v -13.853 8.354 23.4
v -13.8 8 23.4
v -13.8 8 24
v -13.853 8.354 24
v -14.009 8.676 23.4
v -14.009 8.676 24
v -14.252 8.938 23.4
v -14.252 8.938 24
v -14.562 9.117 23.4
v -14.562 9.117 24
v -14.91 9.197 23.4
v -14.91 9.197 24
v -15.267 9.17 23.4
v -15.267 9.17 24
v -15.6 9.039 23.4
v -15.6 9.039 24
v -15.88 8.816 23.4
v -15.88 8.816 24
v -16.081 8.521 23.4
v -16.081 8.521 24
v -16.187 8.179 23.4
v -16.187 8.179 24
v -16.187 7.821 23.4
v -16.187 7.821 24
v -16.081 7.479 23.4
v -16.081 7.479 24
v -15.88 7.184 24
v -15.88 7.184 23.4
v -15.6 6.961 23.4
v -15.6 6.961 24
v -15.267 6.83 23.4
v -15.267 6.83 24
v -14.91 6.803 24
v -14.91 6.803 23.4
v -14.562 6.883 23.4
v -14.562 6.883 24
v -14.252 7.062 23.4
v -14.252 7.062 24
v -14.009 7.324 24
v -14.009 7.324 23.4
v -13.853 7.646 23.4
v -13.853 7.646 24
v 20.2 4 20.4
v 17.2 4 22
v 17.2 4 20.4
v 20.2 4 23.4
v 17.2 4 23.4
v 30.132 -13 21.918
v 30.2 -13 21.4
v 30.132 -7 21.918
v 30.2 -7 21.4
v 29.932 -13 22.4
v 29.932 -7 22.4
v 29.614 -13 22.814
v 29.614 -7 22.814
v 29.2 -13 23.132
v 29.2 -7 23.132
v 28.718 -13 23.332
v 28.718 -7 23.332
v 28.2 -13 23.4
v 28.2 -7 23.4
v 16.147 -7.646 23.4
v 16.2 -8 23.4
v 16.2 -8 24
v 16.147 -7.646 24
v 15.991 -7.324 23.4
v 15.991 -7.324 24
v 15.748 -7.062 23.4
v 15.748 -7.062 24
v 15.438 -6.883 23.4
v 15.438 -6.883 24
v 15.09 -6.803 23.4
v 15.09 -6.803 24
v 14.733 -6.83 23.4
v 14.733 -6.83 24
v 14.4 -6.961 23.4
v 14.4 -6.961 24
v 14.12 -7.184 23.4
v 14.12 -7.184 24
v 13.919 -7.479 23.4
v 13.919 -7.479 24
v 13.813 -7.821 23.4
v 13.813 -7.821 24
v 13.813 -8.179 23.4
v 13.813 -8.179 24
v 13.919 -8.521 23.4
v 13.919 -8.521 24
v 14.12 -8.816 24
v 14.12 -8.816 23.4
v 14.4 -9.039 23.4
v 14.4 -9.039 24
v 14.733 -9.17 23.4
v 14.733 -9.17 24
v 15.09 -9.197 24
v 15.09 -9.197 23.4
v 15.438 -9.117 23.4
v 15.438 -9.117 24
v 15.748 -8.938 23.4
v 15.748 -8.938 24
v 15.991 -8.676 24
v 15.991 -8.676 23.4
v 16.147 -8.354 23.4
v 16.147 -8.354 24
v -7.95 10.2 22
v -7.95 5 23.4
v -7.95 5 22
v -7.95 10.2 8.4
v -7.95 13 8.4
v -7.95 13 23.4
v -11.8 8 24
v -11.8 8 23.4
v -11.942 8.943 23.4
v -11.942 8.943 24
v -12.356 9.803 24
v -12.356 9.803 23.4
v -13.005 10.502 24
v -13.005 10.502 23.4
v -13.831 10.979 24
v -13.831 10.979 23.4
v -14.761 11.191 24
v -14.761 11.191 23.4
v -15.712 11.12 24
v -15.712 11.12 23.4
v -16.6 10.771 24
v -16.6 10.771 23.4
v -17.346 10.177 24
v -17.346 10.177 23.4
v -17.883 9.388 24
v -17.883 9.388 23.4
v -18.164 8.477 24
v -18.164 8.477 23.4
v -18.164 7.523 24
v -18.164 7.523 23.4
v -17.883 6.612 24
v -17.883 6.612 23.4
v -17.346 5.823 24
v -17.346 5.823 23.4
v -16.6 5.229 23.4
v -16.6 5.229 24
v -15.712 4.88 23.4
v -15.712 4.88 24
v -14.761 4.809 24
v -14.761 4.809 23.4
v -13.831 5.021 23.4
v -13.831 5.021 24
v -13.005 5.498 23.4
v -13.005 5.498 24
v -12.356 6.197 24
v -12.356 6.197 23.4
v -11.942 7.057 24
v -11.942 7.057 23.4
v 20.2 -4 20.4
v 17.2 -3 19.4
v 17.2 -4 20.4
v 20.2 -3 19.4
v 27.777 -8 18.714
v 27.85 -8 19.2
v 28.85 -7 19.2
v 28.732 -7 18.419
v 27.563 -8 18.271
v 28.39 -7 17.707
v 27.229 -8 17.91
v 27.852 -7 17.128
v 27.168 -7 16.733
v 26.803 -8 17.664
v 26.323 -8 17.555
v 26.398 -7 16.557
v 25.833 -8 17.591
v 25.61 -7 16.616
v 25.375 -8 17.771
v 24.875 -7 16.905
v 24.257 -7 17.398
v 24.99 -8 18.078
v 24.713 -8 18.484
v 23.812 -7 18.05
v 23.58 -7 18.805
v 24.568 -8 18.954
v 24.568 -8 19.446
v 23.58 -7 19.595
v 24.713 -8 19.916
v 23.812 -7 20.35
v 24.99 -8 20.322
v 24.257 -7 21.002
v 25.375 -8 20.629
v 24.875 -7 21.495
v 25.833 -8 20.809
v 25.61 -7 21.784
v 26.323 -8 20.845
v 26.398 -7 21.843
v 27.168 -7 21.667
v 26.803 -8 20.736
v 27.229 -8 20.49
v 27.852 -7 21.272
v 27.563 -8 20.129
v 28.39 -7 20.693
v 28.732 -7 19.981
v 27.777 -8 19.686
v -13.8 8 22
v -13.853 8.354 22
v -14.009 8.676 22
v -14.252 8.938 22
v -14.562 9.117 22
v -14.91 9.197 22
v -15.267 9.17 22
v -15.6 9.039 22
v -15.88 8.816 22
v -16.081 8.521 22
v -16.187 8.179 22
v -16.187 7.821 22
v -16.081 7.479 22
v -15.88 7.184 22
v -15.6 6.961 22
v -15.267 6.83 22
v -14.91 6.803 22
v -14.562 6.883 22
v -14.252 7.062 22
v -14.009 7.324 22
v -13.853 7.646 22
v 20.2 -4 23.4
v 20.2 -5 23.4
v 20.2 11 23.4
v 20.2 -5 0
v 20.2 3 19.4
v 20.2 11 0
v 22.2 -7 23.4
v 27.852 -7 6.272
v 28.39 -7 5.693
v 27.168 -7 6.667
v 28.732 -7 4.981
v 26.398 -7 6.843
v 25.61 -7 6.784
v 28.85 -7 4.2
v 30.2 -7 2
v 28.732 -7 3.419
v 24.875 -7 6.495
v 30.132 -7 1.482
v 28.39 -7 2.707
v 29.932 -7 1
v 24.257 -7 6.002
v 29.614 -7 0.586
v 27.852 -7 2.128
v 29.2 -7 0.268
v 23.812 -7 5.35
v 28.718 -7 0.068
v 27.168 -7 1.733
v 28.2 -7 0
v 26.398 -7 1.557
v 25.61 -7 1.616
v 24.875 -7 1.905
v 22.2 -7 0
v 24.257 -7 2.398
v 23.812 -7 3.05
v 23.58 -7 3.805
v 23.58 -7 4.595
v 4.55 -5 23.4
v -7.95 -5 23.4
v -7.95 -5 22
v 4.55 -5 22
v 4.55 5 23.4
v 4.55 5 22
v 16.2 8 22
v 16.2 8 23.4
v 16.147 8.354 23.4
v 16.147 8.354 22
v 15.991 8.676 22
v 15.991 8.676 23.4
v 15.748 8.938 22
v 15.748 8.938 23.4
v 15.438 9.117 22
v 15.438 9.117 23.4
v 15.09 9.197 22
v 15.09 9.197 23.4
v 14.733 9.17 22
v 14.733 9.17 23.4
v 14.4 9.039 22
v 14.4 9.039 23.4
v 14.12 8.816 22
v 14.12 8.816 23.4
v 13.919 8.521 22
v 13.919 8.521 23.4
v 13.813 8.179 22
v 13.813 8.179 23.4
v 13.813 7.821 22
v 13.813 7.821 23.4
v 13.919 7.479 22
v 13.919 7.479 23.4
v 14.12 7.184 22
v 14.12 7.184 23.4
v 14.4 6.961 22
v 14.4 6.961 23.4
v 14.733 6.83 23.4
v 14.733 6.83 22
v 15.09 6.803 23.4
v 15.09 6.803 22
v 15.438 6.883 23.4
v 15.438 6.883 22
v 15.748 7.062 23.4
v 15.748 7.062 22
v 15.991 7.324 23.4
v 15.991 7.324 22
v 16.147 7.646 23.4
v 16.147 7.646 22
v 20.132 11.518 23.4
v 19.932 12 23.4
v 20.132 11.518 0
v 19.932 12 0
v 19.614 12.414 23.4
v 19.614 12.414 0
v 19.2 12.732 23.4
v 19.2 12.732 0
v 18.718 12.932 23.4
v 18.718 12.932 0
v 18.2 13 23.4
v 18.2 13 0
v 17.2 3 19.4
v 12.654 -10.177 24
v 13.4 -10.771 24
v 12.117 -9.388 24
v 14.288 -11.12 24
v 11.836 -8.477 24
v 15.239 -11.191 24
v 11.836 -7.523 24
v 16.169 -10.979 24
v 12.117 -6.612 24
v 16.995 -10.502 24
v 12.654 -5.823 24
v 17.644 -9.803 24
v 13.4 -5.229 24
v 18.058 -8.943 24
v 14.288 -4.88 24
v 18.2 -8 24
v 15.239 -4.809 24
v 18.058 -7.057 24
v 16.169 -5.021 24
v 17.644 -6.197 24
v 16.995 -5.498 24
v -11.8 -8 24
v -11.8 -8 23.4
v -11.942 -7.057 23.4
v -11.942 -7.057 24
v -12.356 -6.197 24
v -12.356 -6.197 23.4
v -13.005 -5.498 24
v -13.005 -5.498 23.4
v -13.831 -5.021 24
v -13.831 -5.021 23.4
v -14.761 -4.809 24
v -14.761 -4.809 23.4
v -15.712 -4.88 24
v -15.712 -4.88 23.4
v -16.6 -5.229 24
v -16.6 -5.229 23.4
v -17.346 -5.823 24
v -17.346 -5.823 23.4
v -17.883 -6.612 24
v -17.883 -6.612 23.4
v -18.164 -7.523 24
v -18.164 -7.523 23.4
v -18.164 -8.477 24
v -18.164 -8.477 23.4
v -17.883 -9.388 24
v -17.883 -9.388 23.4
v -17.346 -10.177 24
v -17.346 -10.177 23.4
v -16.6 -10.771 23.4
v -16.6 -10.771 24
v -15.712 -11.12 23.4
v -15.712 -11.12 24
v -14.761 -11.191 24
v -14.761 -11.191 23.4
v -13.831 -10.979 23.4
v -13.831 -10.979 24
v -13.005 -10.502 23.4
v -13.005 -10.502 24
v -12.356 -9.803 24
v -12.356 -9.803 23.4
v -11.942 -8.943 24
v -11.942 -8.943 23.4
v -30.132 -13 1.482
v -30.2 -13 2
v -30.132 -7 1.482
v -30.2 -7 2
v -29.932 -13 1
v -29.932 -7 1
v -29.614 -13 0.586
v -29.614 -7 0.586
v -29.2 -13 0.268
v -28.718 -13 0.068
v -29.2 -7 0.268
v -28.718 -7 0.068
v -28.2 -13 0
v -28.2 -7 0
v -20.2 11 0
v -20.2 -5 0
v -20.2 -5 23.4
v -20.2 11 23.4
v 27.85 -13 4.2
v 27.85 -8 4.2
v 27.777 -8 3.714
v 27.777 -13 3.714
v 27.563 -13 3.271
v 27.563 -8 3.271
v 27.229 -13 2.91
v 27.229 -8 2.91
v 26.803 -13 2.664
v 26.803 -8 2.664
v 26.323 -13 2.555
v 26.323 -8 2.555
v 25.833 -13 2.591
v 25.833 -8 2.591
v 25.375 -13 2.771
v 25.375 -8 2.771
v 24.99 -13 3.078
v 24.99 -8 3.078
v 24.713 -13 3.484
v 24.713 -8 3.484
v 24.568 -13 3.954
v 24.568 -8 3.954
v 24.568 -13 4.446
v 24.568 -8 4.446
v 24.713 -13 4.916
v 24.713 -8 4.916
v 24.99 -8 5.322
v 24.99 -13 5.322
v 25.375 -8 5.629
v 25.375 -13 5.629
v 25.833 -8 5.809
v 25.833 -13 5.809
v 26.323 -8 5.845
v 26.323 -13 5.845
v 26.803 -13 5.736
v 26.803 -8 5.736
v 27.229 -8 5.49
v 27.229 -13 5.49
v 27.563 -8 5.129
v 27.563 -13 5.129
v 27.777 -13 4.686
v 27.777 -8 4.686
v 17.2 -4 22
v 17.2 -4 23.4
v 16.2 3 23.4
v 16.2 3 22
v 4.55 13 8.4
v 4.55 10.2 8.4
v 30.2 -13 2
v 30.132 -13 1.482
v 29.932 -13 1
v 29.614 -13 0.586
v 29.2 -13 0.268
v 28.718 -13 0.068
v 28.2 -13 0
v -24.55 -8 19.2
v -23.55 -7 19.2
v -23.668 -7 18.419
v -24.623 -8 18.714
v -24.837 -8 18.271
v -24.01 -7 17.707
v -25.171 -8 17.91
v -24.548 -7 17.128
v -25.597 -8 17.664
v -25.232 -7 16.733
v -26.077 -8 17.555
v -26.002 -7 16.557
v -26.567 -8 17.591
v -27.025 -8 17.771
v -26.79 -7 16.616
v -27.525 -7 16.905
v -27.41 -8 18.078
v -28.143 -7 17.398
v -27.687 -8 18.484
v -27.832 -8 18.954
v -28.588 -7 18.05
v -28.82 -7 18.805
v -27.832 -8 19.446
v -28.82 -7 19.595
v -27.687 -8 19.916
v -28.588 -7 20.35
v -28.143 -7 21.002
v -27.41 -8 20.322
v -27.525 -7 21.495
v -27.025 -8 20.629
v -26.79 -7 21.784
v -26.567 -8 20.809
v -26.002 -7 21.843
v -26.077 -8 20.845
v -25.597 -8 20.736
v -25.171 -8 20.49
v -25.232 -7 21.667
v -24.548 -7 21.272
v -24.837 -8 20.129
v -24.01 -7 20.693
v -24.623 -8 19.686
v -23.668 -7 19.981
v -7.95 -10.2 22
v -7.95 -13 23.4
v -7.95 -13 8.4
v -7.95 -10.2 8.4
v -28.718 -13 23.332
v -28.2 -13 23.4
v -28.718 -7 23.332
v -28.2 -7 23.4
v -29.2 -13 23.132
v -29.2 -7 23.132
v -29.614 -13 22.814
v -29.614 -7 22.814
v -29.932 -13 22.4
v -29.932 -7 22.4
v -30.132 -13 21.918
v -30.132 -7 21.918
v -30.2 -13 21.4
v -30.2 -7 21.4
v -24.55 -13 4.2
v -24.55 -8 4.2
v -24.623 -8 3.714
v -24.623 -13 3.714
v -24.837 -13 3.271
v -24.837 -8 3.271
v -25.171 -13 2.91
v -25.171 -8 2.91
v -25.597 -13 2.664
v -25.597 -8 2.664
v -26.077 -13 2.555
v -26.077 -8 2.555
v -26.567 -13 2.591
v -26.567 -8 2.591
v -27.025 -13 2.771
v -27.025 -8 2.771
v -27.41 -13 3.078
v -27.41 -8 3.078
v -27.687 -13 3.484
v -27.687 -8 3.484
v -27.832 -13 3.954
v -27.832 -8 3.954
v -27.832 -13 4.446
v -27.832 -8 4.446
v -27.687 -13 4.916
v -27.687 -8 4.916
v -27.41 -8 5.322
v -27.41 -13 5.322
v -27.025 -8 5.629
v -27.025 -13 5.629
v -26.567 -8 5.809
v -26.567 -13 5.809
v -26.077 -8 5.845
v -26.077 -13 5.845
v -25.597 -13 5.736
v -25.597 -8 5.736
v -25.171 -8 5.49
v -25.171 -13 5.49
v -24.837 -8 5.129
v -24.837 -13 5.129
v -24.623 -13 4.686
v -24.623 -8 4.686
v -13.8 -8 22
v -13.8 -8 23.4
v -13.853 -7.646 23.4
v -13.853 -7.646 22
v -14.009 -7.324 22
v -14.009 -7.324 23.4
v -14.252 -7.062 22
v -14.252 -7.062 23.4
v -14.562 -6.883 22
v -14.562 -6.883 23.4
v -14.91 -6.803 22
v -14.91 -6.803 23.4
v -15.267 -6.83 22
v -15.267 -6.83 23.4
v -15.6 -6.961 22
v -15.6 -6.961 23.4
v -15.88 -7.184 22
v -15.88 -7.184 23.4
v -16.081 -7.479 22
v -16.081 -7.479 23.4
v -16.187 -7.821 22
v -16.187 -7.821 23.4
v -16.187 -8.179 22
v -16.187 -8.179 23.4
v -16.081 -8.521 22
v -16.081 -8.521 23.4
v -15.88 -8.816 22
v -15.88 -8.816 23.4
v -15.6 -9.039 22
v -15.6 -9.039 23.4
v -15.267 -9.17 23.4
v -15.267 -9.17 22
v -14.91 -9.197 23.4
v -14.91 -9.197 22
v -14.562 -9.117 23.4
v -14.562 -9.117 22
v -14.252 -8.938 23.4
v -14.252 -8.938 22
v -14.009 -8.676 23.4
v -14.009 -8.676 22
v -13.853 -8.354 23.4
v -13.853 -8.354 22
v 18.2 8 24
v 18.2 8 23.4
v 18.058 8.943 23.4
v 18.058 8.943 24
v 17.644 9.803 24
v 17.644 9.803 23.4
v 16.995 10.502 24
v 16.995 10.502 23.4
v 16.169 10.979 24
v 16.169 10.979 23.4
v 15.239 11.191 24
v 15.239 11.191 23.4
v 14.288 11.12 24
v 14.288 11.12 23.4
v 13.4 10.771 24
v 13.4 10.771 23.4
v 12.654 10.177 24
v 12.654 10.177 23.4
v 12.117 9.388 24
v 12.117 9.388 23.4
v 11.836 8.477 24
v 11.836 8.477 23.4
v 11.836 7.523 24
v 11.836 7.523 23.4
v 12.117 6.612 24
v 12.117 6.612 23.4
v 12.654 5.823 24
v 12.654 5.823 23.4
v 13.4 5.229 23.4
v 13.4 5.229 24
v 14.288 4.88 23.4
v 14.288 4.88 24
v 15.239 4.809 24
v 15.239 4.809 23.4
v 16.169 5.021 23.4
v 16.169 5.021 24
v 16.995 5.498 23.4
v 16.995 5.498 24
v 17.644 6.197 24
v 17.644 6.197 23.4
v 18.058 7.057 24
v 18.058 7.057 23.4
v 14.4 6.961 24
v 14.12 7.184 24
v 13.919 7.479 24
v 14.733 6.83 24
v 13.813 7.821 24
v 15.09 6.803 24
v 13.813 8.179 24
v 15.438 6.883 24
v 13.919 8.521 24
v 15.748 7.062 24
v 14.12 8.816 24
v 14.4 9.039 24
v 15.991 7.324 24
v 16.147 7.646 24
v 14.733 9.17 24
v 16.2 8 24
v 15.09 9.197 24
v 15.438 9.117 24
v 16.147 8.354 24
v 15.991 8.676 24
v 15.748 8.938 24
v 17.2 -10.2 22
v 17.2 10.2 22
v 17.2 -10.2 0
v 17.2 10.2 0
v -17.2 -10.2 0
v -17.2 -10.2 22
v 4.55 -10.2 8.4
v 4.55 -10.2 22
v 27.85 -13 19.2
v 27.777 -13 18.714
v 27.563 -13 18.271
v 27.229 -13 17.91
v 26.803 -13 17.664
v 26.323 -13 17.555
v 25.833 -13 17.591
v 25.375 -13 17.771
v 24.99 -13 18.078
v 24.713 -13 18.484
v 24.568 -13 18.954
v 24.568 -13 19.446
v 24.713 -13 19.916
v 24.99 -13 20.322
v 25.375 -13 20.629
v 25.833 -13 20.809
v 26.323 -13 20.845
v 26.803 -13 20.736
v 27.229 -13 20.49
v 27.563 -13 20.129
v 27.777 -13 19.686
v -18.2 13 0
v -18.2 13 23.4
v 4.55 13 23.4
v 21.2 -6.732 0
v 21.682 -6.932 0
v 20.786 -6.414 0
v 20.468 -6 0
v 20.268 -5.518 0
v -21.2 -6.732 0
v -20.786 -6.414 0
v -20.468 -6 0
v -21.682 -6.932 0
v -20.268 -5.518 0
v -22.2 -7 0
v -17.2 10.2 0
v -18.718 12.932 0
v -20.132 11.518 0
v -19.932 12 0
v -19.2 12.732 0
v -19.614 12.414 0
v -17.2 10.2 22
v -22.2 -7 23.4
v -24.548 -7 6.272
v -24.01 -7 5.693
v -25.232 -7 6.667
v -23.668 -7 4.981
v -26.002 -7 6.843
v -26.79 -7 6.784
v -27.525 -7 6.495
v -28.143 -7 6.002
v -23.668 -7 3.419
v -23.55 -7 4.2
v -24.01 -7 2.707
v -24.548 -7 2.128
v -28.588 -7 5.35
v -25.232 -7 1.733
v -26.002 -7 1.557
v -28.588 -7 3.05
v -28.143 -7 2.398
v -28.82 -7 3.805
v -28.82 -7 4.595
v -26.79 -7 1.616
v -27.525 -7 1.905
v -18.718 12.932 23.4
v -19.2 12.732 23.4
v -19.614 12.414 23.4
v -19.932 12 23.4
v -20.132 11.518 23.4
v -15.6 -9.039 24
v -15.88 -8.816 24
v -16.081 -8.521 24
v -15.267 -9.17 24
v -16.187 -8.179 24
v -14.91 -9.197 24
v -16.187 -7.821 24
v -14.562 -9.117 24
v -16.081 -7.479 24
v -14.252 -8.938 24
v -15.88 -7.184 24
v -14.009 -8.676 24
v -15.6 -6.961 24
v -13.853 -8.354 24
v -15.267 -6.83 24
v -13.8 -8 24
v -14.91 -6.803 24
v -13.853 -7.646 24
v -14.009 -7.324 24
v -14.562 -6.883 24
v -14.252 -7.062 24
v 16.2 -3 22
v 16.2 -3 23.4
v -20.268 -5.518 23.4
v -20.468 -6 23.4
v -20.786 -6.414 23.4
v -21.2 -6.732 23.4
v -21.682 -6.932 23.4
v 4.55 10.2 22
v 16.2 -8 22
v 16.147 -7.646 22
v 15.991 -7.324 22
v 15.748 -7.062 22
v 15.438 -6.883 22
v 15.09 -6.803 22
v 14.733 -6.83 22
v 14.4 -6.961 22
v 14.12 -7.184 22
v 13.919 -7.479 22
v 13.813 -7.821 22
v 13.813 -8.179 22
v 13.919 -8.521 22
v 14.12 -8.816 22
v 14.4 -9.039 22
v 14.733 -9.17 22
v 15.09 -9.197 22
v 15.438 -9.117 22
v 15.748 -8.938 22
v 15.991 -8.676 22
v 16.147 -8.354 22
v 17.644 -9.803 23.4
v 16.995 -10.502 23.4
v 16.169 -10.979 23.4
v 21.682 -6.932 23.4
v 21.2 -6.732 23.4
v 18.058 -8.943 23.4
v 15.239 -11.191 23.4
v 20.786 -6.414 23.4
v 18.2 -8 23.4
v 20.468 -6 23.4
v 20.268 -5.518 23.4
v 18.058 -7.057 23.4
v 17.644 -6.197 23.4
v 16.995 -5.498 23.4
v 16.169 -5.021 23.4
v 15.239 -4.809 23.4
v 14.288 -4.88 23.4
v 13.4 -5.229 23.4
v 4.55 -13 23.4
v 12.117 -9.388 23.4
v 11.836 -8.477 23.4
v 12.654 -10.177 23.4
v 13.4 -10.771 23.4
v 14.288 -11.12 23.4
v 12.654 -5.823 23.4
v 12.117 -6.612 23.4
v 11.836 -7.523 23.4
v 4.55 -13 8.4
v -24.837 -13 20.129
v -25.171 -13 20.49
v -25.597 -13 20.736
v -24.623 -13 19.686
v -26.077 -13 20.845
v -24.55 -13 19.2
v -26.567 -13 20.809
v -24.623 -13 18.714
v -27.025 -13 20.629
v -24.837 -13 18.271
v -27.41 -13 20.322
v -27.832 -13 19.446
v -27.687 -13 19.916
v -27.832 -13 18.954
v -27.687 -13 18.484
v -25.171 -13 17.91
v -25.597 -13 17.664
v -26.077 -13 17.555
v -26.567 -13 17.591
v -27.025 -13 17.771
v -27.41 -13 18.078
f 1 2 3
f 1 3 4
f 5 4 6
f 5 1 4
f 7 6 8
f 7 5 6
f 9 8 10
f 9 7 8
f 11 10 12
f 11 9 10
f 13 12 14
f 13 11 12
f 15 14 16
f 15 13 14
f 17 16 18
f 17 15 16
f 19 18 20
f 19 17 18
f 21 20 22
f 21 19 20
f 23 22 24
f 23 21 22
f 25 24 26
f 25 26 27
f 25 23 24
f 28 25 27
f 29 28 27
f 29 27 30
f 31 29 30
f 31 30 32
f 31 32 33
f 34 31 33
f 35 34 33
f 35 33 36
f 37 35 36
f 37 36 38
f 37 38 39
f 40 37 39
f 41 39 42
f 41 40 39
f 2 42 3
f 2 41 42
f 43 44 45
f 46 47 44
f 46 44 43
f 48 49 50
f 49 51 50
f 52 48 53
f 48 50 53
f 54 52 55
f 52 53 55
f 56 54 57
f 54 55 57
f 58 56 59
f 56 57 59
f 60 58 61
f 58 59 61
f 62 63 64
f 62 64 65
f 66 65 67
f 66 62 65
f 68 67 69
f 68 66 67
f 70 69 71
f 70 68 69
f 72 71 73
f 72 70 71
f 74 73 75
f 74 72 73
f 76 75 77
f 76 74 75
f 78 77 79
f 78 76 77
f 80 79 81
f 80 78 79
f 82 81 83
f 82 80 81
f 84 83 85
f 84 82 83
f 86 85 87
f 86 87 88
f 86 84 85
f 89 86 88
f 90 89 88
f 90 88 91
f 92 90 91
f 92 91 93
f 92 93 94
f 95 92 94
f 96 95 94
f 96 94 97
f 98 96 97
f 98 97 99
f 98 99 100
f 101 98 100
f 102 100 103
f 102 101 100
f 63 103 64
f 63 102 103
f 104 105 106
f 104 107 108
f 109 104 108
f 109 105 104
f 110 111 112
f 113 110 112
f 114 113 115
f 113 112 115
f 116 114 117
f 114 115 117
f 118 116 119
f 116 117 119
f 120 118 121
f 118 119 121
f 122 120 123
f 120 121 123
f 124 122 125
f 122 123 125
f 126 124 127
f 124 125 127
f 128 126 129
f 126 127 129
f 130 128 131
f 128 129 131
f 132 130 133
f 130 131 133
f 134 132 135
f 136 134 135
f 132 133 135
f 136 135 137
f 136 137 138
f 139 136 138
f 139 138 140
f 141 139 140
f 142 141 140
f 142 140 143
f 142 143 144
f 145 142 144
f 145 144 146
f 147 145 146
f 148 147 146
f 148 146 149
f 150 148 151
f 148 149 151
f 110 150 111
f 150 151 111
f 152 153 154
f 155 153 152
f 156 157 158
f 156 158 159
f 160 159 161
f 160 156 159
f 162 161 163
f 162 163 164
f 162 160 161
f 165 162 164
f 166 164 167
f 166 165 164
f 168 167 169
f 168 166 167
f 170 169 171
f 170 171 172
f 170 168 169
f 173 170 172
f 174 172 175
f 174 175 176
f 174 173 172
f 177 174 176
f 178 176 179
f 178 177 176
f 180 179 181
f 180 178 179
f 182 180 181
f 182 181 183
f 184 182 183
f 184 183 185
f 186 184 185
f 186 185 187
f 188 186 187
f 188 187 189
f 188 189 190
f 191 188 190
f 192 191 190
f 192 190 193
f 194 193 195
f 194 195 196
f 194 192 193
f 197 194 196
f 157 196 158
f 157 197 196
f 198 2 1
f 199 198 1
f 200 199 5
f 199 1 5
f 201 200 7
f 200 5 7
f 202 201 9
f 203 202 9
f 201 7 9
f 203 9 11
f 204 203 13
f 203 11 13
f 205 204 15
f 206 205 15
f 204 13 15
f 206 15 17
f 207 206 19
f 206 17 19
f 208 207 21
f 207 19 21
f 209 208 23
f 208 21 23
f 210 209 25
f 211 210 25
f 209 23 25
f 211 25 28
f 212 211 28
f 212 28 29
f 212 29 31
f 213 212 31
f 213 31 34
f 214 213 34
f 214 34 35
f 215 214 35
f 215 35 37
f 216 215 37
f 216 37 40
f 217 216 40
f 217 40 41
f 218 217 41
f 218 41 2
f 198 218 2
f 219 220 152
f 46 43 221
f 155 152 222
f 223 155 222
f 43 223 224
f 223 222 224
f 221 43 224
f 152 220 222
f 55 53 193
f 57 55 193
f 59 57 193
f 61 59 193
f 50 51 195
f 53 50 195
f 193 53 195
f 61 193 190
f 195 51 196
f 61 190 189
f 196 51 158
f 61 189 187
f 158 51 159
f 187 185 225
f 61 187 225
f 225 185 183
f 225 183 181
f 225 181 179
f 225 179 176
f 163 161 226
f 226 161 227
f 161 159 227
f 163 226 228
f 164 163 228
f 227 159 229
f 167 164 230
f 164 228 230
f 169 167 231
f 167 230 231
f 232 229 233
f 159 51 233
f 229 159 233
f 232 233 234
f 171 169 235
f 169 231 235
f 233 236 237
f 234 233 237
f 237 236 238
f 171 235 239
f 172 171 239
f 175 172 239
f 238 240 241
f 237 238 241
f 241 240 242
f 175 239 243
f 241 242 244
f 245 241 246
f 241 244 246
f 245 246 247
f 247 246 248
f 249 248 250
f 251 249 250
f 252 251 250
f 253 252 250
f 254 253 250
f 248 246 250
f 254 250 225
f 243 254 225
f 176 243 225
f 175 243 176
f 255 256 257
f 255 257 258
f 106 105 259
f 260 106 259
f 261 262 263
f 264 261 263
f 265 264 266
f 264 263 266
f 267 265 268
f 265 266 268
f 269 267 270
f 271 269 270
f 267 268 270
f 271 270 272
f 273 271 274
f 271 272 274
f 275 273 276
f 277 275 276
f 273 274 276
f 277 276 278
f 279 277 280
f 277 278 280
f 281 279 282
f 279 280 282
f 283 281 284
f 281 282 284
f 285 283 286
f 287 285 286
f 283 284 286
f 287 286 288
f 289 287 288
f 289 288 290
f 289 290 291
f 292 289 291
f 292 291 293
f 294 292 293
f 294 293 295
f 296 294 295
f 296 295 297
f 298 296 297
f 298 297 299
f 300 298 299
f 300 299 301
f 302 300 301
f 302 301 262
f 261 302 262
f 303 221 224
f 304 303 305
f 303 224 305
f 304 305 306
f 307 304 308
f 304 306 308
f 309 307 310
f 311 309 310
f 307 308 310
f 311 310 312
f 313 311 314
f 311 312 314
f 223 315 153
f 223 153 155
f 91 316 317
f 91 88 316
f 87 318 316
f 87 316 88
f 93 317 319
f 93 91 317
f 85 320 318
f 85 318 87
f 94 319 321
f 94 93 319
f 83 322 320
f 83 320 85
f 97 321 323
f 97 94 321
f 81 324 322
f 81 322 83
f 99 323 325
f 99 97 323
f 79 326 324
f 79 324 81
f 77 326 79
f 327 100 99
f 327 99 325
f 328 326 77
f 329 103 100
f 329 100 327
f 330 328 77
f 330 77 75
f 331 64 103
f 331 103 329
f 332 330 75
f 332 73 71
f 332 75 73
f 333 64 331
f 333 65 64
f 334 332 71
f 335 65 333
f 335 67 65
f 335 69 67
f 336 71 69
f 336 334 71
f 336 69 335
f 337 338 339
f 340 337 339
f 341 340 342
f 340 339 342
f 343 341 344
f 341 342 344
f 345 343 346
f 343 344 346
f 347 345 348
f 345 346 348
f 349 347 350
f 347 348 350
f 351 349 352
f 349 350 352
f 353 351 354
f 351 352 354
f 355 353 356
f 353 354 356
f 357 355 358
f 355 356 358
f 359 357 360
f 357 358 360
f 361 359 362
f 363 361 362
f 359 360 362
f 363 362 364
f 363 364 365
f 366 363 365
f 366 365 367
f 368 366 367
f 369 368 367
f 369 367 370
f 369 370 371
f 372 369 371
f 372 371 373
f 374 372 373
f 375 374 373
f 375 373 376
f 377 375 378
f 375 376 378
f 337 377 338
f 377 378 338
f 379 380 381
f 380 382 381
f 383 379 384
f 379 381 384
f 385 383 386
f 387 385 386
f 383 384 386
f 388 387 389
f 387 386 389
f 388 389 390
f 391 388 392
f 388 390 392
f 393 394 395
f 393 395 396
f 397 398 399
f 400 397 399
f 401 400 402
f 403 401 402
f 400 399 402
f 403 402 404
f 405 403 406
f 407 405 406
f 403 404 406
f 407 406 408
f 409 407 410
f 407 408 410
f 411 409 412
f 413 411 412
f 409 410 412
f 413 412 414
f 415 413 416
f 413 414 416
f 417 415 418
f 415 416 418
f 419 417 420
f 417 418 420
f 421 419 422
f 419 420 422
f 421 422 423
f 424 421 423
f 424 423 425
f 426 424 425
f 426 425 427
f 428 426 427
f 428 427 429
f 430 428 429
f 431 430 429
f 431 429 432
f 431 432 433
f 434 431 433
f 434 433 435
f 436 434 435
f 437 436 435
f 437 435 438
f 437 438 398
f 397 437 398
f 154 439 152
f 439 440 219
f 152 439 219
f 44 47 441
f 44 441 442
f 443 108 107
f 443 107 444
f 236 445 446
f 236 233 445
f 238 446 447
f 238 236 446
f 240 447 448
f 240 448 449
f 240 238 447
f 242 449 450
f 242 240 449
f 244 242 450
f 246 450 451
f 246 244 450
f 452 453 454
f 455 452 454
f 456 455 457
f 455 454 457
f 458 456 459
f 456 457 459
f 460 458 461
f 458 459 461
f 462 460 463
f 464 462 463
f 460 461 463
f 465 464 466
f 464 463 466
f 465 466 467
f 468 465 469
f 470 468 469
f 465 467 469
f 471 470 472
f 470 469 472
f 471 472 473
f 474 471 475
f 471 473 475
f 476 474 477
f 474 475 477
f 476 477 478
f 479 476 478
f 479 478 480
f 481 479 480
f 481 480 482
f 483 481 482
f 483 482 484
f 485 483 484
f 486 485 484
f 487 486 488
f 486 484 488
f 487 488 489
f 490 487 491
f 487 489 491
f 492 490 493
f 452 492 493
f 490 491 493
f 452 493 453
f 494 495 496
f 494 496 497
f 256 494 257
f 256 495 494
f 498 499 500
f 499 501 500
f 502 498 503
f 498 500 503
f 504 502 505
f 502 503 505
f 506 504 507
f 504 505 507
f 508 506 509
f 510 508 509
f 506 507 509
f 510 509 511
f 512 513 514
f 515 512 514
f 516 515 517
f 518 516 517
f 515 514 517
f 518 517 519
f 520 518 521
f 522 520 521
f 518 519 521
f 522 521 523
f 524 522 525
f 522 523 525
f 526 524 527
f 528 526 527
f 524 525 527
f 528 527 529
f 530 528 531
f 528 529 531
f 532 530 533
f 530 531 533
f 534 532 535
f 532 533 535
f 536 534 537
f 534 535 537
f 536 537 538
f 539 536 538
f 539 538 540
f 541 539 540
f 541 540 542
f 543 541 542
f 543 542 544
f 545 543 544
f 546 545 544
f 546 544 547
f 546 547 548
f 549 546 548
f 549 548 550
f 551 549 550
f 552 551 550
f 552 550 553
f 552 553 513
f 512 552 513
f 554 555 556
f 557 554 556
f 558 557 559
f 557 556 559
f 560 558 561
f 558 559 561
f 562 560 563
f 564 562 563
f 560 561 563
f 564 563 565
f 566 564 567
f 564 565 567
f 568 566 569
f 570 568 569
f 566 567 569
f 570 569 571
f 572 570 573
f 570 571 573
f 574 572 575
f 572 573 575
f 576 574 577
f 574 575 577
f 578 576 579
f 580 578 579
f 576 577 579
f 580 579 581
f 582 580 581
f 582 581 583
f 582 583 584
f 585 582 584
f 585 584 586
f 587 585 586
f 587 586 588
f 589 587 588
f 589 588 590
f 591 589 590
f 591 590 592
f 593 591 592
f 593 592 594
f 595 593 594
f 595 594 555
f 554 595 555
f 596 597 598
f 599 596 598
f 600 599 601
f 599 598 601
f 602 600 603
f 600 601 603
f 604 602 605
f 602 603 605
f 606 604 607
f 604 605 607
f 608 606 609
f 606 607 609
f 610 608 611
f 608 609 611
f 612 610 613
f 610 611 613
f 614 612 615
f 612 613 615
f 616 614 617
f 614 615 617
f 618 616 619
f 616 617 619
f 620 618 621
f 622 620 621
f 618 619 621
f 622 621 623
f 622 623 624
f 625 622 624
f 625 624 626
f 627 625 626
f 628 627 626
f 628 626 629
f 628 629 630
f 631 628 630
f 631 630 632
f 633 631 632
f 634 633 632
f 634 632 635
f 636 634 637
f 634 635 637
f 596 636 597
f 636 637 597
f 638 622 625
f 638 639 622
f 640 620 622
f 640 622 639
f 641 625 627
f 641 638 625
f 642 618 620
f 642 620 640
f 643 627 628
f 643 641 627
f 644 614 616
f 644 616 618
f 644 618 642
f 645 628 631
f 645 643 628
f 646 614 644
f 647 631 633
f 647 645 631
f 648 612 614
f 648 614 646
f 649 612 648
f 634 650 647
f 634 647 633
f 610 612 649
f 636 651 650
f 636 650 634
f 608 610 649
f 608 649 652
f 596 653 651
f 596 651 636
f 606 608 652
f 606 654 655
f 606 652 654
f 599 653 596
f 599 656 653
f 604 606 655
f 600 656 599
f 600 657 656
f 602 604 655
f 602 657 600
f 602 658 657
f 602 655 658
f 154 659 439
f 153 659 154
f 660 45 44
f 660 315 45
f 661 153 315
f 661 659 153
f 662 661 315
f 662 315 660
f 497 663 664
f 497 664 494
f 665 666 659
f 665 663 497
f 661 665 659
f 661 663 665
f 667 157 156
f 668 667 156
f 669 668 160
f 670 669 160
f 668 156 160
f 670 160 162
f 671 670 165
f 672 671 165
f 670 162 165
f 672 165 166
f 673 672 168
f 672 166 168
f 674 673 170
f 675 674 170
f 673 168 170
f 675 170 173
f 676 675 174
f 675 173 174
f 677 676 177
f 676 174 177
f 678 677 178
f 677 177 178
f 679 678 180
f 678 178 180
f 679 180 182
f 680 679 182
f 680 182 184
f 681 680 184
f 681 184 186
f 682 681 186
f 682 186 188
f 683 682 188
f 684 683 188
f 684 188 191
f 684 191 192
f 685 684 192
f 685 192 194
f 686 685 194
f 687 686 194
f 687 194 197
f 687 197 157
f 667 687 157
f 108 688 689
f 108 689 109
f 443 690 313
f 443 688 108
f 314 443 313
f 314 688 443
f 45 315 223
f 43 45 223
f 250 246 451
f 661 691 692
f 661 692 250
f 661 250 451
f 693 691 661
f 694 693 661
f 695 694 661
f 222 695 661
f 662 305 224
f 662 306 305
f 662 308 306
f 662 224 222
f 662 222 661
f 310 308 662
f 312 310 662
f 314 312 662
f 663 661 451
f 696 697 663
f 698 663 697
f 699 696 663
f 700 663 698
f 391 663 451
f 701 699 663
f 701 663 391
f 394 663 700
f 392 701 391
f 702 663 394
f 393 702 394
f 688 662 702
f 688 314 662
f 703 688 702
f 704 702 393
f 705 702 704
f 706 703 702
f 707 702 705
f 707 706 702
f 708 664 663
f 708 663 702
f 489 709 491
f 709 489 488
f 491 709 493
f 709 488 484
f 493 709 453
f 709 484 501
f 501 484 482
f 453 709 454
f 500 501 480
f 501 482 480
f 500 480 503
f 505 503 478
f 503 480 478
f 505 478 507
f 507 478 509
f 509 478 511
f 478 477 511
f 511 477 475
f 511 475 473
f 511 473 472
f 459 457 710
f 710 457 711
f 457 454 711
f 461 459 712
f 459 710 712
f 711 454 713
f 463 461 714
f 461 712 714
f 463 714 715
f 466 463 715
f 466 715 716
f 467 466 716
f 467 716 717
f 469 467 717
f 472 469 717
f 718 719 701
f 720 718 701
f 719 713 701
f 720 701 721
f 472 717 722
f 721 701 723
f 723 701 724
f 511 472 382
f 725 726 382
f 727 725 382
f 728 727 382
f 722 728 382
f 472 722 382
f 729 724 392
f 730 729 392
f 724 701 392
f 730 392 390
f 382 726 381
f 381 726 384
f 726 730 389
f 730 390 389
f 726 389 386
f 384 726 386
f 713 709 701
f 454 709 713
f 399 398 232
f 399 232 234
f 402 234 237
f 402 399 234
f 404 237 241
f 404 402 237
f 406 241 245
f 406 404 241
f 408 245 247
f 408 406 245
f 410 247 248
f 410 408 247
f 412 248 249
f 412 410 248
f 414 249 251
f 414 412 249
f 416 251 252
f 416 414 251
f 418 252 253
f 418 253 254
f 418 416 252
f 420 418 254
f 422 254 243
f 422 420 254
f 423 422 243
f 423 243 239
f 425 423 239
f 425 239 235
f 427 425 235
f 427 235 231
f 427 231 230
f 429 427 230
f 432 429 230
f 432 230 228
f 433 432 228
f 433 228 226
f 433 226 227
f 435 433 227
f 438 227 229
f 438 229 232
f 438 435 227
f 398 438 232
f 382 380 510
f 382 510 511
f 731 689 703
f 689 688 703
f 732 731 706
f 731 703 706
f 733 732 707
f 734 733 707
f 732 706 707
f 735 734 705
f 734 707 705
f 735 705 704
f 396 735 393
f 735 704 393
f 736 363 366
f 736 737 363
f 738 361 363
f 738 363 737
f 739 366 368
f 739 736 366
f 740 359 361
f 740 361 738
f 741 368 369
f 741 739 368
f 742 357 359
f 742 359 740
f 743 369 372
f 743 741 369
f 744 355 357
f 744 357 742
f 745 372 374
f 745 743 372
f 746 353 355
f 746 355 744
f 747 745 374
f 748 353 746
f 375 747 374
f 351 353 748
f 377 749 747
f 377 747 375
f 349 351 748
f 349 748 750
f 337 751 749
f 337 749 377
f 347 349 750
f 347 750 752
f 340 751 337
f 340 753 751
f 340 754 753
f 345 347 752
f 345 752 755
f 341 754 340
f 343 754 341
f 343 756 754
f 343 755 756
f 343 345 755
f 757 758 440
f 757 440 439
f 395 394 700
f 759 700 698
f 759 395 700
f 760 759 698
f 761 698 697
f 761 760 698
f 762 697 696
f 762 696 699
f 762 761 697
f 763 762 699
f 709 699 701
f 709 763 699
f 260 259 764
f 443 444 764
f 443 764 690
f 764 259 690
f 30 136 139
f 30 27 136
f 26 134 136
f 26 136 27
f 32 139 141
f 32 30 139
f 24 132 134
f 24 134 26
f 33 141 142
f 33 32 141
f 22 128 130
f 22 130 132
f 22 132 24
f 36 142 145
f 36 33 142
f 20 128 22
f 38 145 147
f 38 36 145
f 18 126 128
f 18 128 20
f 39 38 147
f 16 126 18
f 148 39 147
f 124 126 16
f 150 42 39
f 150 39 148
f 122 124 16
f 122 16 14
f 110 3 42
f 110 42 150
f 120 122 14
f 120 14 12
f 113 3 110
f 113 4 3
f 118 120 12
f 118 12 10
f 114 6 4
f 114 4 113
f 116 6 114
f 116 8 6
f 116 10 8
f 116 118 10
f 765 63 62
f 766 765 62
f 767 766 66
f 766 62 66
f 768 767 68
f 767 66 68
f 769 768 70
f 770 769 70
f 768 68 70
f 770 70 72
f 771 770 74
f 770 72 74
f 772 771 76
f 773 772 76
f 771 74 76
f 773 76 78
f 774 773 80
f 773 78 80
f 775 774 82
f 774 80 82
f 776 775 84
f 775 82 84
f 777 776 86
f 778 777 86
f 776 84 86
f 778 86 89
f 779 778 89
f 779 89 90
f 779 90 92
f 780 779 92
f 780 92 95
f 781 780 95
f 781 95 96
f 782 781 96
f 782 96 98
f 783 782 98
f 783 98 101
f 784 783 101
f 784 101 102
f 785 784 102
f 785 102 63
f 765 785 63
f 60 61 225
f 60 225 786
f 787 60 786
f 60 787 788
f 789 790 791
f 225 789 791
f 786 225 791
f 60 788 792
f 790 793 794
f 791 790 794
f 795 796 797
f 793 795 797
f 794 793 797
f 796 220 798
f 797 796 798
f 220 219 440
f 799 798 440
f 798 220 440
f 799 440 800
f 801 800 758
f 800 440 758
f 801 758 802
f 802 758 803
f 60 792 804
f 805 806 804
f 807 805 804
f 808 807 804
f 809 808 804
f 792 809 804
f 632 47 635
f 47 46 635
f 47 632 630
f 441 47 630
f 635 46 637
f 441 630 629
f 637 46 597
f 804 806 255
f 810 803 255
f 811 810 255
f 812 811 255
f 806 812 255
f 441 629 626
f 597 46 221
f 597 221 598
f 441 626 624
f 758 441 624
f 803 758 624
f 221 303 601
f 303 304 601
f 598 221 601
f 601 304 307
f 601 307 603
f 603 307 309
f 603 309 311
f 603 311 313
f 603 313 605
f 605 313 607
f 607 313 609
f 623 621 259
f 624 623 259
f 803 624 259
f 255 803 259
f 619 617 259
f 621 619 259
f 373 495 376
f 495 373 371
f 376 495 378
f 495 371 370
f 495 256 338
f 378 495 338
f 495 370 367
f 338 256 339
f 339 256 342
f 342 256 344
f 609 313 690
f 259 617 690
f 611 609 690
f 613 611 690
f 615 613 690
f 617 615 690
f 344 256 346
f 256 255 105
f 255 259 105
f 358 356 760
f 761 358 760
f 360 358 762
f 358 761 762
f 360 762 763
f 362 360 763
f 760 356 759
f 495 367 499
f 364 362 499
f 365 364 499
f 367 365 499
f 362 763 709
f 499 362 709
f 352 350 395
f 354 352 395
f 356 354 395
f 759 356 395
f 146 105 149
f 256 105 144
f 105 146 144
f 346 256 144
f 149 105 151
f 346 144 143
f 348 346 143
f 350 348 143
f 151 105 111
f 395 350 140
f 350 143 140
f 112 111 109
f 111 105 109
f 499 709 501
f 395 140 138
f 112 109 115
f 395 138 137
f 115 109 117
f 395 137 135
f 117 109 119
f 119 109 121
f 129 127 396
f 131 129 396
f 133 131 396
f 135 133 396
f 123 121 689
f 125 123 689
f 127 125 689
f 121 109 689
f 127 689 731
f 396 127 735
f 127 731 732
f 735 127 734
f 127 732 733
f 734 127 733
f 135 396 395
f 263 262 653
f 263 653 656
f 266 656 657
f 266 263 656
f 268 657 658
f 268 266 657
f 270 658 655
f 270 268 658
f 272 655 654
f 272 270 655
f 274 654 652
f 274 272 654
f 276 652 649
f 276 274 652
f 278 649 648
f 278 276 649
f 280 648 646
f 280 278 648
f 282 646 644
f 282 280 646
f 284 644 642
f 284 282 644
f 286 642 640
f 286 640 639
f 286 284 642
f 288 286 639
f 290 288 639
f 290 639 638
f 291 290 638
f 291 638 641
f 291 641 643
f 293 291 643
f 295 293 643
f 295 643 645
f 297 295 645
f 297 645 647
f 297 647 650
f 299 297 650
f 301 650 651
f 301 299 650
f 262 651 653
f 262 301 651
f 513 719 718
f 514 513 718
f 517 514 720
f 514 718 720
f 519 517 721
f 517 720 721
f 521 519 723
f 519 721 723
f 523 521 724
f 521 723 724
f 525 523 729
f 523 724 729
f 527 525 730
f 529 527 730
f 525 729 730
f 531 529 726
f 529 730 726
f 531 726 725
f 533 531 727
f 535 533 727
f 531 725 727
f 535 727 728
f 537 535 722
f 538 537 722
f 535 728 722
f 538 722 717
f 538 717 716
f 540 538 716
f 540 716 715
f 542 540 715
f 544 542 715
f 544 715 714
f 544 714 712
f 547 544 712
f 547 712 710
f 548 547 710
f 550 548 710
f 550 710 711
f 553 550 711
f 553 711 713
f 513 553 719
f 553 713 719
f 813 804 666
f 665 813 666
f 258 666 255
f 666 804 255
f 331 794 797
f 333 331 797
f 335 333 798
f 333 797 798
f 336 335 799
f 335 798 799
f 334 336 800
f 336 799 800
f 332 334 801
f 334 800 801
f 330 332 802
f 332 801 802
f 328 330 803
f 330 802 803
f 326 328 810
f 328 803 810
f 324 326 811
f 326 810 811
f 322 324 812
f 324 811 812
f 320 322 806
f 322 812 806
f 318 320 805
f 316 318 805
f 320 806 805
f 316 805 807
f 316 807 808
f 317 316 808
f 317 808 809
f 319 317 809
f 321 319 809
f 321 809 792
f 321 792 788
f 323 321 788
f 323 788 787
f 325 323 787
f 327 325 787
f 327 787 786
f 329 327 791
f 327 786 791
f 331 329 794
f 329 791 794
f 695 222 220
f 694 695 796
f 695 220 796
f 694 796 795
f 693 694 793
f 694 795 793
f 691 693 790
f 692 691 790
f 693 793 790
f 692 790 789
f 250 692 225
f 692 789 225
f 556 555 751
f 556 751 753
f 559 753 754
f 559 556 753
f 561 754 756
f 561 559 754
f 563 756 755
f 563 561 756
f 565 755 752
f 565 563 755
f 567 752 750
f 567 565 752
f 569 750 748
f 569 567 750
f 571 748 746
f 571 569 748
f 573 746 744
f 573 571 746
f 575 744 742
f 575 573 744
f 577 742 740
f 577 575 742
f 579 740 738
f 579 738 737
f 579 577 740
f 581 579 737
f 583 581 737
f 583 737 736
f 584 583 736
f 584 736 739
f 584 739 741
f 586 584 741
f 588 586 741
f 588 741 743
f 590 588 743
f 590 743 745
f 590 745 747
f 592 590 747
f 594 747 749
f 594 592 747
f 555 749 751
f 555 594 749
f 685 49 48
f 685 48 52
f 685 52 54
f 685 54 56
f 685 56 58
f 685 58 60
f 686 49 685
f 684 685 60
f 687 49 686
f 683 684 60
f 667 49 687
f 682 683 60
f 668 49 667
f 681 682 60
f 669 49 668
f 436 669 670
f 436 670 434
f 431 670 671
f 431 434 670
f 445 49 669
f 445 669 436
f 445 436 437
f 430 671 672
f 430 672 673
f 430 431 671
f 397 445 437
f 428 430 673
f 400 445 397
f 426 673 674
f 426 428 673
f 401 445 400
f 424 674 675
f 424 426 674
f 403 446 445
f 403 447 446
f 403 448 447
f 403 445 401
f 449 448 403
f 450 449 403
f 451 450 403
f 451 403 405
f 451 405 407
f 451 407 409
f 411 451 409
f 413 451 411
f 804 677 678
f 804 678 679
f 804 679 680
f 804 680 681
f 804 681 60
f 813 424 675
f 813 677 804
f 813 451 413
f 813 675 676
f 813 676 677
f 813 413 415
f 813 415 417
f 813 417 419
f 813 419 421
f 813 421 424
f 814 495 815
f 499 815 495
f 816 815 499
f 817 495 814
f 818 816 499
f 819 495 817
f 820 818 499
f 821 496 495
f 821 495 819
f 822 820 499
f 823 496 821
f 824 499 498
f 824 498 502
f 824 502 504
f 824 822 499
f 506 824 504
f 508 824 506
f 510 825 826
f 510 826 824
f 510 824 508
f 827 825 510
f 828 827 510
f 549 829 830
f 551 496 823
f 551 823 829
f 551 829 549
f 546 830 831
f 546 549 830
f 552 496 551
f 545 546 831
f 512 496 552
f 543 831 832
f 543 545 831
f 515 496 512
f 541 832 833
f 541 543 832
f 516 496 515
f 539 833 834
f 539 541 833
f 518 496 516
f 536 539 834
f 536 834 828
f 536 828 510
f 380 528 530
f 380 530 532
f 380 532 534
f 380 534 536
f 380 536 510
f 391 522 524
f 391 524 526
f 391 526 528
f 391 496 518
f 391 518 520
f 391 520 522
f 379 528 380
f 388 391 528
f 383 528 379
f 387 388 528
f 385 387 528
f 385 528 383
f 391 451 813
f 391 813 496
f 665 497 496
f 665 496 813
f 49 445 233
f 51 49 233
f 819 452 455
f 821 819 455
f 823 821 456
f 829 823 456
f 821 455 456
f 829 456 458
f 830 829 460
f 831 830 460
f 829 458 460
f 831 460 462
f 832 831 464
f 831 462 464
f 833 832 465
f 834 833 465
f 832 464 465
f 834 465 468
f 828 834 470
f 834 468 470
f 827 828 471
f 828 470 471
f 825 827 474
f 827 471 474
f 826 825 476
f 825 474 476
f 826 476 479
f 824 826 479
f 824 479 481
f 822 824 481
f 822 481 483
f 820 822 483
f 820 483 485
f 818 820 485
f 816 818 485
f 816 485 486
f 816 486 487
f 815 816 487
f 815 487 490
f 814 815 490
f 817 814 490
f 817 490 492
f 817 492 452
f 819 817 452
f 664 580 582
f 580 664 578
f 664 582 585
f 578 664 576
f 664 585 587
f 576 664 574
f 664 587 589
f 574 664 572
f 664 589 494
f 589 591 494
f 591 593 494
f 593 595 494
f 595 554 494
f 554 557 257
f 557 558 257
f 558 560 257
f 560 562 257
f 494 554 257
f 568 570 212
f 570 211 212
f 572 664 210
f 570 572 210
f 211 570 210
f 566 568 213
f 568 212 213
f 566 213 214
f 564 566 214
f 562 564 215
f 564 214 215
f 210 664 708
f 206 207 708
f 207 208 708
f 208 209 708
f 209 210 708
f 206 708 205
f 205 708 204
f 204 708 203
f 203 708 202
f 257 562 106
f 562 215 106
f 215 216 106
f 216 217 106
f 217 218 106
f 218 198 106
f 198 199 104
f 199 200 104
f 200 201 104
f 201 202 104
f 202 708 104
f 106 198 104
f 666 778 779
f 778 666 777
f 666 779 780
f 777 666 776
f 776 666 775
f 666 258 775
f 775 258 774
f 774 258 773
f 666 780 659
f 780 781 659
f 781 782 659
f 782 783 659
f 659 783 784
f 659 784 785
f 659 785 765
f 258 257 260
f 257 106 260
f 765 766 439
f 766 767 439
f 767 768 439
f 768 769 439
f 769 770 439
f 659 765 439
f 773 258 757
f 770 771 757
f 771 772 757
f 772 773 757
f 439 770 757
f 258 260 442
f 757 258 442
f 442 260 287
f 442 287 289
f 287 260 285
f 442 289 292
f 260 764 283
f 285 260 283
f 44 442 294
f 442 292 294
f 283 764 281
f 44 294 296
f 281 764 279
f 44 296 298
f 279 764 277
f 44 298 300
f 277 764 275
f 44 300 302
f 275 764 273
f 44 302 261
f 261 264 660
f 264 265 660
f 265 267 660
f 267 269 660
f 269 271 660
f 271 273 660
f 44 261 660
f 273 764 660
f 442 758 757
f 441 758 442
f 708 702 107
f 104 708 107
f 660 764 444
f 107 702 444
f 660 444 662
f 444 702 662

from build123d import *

# Parameters (mm, degrees)
SKETCH1_W           = 40.4
SKETCH1_H           = 26
SKETCH1_W_2         = 34.4
SKETCH1_H_2         = 20.4
BOSS_EXTRUDE1_DEPTH = 22
SKETCH2_W           = 40.4
SKETCH2_H           = 26
BOSS_EXTRUDE2_DEPTH = 1.4
SKETCH3_W           = 12.5
SKETCH3_H           = 8
CUT_EXTRUDE1_DEPTH  = 15
SKETCH4_R           = 1.2
CUT_EXTRUDE2_DEPTH  = 24.4
SKETCH5_W           = 10
SKETCH5_H           = 6
BOSS_EXTRUDE3_DEPTH = 23.4
FILLET1_R           = 2
SKETCH6_R           = 1.65
CUT_EXTRUDE3_DEPTH  = 7
CHAMFER1_SIZE       = 1
SKETCH8_W           = 4
SKETCH8_H           = 8
CUT_EXTRUDE4_DEPTH  = 4
CHAMFER2_SIZE       = 1
SKETCH9_R           = 3.2
SKETCH9_R_2         = 1.2
BOSS_EXTRUDE4_DEPTH = 0.6


with BuildPart() as part:
    # Sketch1 → Boss-Extrude1 (new body)
    with BuildSketch(Plane.XY):
        Rectangle(SKETCH1_W, SKETCH1_H)
        Rectangle(SKETCH1_W_2, SKETCH1_H_2, mode=Mode.SUBTRACT)
    extrude(amount=BOSS_EXTRUDE1_DEPTH)

    # Sketch2 → Boss-Extrude2 (add)
    with BuildSketch(Plane.XY.offset(22)):
        Rectangle(SKETCH2_W, SKETCH2_H)
    extrude(amount=BOSS_EXTRUDE2_DEPTH)

    # Sketch3 → Cut-Extrude1 (cut)
    with BuildSketch(Plane.XY.offset(23.4)):
        with Locations((-1.7, 9)):
            Rectangle(SKETCH3_W, SKETCH3_H)
        with Locations((-1.7, -9)):
            Rectangle(SKETCH3_W, SKETCH3_H)
    extrude(amount=-CUT_EXTRUDE1_DEPTH, mode=Mode.SUBTRACT)

    # Sketch4 → Cut-Extrude2 (cut, through all)
    with BuildSketch(Plane.XY.offset(23.4)):
        with Locations((-15, 8)):
            Circle(SKETCH4_R)
        with Locations((-15, -8)):
            Circle(SKETCH4_R)
        with Locations((15, 8)):
            Circle(SKETCH4_R)
        with Locations((15, -8)):
            Circle(SKETCH4_R)
    extrude(amount=-CUT_EXTRUDE2_DEPTH, mode=Mode.SUBTRACT)

    # Sketch5 → Boss-Extrude3 (add)
    with BuildSketch(Plane(origin=(0, 0, 0), x_dir=(-1, 0, 0), z_dir=(0, 0, -1))):
        with Locations((-25.2, -10)):
            Rectangle(SKETCH5_W, SKETCH5_H)
        with Locations((25.2, -10)):
            Rectangle(SKETCH5_W, SKETCH5_H)
    extrude(amount=-BOSS_EXTRUDE3_DEPTH)

    # Fillet1
    fillet1_edges = [part.edges().sort_by_distance(p)[0] for p in [
        (30.2, -10, 0),
        (30.2, -10, 23.4),
        (20.2, -7, 11.7),
        (-30.2, -10, 0),
        (-30.2, -10, 23.4),
        (-20.2, -7, 11.7),
        (-20.2, 13, 11.7),
        (20.2, 13, 11.7),
    ]]
    fillet(fillet1_edges, radius=FILLET1_R)

    # Sketch6 → Cut-Extrude3 (cut, through all)
    with BuildSketch(Plane(origin=(0, -7, 0), x_dir=(1, 0, 0), z_dir=(0, 1, 0))):
        with Locations((26.2, -4.2)):
            Circle(SKETCH6_R)
        with Locations((26.2, -19.2)):
            Circle(SKETCH6_R)
        with Locations((-26.2, -19.2)):
            Circle(SKETCH6_R)
        with Locations((-26.2, -4.2)):
            Circle(SKETCH6_R)
    extrude(amount=-CUT_EXTRUDE3_DEPTH, mode=Mode.SUBTRACT)

    # Chamfer1
    chamfer1_edges = [part.edges().sort_by_distance(p)[0] for p in [
        (-27.85, -7, 4.2),
        (-27.85, -7, 19.2),
        (24.55, -7, 19.2),
        (24.55, -7, 4.2),
    ]]
    chamfer(chamfer1_edges, length=CHAMFER1_SIZE)

    # Sketch8 → Cut-Extrude4 (cut)
    with BuildSketch(Plane.XY.offset(23.4)):
        with Locations((18.2, 0)):
            Rectangle(SKETCH8_W, SKETCH8_H)
    extrude(amount=-CUT_EXTRUDE4_DEPTH, mode=Mode.SUBTRACT)

    # Chamfer2
    chamfer2_edges = [part.edges().sort_by_distance(p)[0] for p in [
        (16.2, -4, 22.7),
        (16.2, 4, 22.7),
        (18.7, 4, 19.4),
        (18.7, -4, 19.4),
    ]]
    chamfer(chamfer2_edges, length=CHAMFER2_SIZE)

    # Sketch9 → Boss-Extrude4 (add)
    with BuildSketch(Plane.XY.offset(23.4)):
        with Locations((-15, 8)):
            Circle(SKETCH9_R)
        with Locations((-15, 8)):
            Circle(SKETCH9_R_2, mode=Mode.SUBTRACT)
        with Locations((-15, -8)):
            Circle(SKETCH9_R)
        with Locations((-15, -8)):
            Circle(SKETCH9_R_2, mode=Mode.SUBTRACT)
        with Locations((15, -8)):
            Circle(SKETCH9_R)
        with Locations((15, -8)):
            Circle(SKETCH9_R_2, mode=Mode.SUBTRACT)
        with Locations((15, 8)):
            Circle(SKETCH9_R)
        with Locations((15, 8)):
            Circle(SKETCH9_R_2, mode=Mode.SUBTRACT)
    extrude(amount=BOSS_EXTRUDE4_DEPTH)


solid = part.part
